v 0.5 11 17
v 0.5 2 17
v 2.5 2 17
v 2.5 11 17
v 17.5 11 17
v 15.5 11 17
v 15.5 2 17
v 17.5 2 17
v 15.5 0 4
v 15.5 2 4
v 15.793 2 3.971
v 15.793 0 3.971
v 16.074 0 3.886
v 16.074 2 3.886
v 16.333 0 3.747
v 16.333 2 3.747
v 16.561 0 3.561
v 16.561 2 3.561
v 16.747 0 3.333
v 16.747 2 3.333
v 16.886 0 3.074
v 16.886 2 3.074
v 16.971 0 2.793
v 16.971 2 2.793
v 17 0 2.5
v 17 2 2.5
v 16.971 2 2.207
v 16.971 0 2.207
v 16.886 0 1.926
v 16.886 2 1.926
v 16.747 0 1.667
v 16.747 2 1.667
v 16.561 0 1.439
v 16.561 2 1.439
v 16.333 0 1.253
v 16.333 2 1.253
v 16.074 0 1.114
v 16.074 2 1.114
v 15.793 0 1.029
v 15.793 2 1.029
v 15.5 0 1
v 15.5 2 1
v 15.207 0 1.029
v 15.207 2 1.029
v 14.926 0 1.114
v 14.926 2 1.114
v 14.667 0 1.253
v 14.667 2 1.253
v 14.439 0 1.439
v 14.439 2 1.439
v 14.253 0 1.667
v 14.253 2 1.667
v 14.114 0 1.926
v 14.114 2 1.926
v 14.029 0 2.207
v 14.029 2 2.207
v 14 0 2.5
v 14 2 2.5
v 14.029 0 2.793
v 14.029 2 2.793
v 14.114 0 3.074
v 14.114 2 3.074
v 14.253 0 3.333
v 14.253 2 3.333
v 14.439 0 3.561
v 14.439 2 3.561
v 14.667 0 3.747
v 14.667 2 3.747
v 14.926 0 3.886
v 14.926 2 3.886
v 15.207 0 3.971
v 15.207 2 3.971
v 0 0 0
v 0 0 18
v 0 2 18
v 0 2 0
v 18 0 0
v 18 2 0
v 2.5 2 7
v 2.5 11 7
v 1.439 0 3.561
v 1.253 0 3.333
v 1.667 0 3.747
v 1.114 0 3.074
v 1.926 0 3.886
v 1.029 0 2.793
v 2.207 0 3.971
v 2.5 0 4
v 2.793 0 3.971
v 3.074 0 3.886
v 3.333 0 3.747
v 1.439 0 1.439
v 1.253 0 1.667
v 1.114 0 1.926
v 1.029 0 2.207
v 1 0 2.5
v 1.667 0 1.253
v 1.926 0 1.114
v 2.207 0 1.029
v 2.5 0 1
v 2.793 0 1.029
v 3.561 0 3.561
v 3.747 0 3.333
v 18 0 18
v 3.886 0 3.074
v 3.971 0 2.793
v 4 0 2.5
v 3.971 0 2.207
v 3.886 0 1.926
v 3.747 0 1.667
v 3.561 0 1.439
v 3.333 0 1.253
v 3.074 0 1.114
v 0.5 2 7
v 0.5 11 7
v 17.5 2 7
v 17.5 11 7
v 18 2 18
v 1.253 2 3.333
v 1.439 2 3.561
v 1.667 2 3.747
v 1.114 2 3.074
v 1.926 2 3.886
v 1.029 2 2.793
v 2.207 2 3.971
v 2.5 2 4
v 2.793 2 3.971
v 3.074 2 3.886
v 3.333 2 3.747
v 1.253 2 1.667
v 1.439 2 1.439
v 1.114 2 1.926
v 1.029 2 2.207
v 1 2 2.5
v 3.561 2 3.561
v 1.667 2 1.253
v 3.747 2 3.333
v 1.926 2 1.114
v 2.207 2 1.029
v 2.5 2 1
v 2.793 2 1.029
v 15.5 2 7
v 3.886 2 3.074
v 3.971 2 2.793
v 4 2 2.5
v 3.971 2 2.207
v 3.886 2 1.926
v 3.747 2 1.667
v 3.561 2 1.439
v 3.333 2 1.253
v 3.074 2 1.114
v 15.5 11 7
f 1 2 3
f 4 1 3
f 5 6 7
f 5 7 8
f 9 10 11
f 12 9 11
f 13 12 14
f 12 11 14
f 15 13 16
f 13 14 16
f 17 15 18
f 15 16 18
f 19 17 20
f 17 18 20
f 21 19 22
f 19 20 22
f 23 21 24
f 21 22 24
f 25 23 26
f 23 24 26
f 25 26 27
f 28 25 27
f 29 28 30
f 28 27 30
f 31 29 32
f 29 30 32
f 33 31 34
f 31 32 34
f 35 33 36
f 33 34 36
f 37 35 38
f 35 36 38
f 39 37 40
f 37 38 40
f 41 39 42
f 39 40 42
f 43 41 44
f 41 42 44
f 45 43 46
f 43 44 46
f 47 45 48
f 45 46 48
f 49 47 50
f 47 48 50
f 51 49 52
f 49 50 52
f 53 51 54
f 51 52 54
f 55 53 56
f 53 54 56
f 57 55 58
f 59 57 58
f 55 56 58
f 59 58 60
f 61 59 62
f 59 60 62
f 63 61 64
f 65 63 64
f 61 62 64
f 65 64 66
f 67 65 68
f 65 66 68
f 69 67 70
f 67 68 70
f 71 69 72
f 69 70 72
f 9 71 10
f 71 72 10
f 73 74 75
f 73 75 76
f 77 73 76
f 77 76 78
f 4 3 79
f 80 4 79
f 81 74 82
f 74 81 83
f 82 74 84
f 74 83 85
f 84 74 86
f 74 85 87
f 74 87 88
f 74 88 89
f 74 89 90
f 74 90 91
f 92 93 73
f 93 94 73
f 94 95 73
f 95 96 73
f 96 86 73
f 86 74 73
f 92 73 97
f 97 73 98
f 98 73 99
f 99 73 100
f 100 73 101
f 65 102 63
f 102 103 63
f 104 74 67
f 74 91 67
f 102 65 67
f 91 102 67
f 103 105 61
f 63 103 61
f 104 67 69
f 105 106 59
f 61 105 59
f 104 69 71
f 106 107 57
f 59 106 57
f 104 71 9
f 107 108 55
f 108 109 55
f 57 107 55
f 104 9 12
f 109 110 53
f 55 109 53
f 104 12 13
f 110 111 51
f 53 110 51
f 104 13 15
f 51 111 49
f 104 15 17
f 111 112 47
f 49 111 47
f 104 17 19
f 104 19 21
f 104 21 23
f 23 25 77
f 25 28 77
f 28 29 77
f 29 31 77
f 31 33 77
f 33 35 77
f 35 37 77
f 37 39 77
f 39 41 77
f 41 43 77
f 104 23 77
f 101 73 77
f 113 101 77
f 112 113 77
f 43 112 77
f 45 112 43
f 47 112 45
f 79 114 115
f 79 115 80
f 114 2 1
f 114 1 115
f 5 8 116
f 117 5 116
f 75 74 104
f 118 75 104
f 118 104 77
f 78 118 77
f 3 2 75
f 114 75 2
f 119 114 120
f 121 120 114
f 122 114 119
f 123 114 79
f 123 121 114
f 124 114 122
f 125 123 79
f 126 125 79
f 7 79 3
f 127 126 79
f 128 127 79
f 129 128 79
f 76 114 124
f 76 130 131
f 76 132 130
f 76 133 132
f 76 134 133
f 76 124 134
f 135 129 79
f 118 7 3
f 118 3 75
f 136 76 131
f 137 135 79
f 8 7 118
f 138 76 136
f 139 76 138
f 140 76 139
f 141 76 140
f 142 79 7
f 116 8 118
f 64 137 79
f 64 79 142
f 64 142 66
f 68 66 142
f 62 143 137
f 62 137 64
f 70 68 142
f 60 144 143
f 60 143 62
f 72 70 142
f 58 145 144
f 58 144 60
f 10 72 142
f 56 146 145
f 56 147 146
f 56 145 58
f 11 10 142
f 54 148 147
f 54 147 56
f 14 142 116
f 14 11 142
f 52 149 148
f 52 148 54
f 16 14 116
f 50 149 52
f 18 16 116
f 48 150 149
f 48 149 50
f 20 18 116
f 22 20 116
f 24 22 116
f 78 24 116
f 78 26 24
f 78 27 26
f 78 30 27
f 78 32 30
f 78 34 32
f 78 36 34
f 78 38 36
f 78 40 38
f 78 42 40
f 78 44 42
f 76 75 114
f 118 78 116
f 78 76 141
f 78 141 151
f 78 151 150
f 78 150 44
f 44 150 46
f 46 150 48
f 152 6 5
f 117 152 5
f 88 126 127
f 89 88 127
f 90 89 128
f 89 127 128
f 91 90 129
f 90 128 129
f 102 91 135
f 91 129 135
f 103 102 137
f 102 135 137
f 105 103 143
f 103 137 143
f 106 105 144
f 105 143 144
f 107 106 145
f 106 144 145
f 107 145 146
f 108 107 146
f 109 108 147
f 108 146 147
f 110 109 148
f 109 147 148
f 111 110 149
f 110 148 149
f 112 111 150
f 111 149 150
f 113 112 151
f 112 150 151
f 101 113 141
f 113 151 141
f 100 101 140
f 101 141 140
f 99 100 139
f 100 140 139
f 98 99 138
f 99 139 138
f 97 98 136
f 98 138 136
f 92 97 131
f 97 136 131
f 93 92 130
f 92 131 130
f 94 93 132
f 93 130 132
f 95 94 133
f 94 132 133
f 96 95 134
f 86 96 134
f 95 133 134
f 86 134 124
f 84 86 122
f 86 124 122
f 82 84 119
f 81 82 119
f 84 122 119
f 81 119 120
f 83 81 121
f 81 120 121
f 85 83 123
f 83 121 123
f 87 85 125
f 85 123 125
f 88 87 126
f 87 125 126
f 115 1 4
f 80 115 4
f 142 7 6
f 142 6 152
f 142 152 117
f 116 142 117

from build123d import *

# Parameters (mm, degrees)
SKETCH1_W           = 18
SKETCH1_H           = 18
BOSS_EXTRUDE1_DEPTH = 2
SKETCH2_R           = 1.5
CUT_EXTRUDE1_DEPTH  = 2
SKETCH3_W           = 2
SKETCH3_H           = 10
BOSS_EXTRUDE2_DEPTH = 9


with BuildPart() as part:
    # Sketch1 → Boss-Extrude1 (new body)
    with BuildSketch(Plane(origin=(0, 0, 0), x_dir=(1, 0, 0), z_dir=(0, 1, 0))):
        with Locations((9, -9)):
            Rectangle(SKETCH1_W, SKETCH1_H)
    extrude(amount=BOSS_EXTRUDE1_DEPTH)

    # Sketch2 → Cut-Extrude1 (cut)
    with BuildSketch(Plane(origin=(0, 2, 0), x_dir=(1, 0, 0), z_dir=(0, 1, 0))):
        with Locations(Location((2.5, -2.5, 0), (0, 0, 270))):
            Circle(SKETCH2_R)
        with Locations(Location((15.5, -2.5, 0), (0, 0, 270))):
            Circle(SKETCH2_R)
    extrude(amount=-CUT_EXTRUDE1_DEPTH, mode=Mode.SUBTRACT)

    # Sketch3 → Boss-Extrude2 (add)
    with BuildSketch(Plane(origin=(0, 2, 0), x_dir=(1, 0, 0), z_dir=(0, 1, 0))):
        with Locations((1.5, -12)):
            Rectangle(SKETCH3_W, SKETCH3_H)
        with Locations((16.5, -12)):
            Rectangle(SKETCH3_W, SKETCH3_H)
    extrude(amount=BOSS_EXTRUDE2_DEPTH)


solid = part.part
